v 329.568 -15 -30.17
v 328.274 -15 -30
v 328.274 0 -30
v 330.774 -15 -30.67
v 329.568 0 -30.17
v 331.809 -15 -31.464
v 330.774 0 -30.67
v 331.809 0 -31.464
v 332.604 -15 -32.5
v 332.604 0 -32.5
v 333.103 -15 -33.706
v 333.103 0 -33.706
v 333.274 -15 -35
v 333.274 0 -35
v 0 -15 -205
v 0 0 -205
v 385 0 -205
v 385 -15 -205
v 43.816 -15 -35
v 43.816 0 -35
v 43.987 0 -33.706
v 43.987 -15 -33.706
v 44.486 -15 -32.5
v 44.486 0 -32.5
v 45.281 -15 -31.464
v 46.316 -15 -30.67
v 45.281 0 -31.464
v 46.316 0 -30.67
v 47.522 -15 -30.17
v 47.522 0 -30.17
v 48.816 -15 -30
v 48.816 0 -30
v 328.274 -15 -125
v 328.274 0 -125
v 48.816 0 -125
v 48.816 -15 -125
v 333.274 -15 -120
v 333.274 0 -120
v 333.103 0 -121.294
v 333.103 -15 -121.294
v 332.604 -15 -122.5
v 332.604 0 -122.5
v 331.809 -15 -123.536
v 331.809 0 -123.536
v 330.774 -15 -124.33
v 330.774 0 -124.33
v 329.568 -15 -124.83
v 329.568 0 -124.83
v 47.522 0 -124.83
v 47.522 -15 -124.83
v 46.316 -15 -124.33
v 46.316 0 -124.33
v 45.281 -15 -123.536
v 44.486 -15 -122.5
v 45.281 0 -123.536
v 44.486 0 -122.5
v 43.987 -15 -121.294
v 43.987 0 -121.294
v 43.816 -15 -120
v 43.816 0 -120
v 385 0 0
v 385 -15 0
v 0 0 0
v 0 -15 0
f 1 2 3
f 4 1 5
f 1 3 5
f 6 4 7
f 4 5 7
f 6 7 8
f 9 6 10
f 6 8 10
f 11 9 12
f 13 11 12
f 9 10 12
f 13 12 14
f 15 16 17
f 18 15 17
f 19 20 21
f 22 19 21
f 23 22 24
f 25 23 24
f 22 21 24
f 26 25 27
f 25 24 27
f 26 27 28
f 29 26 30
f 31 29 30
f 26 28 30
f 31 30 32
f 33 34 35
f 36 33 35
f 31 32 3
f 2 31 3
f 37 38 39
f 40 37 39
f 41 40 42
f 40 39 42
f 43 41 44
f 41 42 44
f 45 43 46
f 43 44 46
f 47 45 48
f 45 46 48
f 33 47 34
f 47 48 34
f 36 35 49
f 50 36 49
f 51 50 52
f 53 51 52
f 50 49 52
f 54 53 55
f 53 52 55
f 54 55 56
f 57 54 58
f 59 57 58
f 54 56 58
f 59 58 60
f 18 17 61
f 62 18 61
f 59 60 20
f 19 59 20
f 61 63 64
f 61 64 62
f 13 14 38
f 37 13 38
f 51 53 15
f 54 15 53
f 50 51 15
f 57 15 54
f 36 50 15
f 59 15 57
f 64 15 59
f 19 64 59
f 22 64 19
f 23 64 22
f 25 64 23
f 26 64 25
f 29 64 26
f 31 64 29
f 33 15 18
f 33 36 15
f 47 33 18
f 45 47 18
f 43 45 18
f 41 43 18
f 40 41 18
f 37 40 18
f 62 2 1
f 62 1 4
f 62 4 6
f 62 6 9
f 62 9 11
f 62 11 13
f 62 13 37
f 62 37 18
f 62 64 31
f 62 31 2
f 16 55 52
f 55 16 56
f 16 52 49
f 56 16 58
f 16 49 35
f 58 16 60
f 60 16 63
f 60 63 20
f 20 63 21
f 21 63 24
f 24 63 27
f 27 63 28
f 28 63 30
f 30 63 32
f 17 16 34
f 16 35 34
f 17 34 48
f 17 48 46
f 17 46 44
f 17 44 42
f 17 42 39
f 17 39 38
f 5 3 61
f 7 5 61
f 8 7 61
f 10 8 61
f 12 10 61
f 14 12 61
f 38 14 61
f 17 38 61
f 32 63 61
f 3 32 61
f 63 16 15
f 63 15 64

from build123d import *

# Parameters (mm, degrees)
F0_W     = 385
F0_H     = 205
F1_DEPTH = 15


with BuildPart() as f1:
    # F0 (on Front) → F1 (new body)
    with BuildSketch(Plane.XZ):
        with Locations((192.5, -102.5)):
            Rectangle(F0_W, F0_H)
        with BuildLine():
            ThreePointArc((43.81616, -35), (45.280627, -31.464466), (48.81616, -30))
            Line((48.81616, -30), (328.273739, -30))
            ThreePointArc((328.273739, -30), (331.809273, -31.464466), (333.273739, -35))
            Line((333.273739, -35), (333.273739, -120))
            ThreePointArc((333.273739, -120), (331.809273, -123.535534), (328.273739, -125))
            Line((328.273739, -125), (48.81616, -125))
            ThreePointArc((48.81616, -125), (45.280627, -123.535534), (43.81616, -120))
            Line((43.81616, -120), (43.81616, -35))
        make_face(mode=Mode.SUBTRACT)
    extrude(amount=F1_DEPTH)


solid = f1.part
